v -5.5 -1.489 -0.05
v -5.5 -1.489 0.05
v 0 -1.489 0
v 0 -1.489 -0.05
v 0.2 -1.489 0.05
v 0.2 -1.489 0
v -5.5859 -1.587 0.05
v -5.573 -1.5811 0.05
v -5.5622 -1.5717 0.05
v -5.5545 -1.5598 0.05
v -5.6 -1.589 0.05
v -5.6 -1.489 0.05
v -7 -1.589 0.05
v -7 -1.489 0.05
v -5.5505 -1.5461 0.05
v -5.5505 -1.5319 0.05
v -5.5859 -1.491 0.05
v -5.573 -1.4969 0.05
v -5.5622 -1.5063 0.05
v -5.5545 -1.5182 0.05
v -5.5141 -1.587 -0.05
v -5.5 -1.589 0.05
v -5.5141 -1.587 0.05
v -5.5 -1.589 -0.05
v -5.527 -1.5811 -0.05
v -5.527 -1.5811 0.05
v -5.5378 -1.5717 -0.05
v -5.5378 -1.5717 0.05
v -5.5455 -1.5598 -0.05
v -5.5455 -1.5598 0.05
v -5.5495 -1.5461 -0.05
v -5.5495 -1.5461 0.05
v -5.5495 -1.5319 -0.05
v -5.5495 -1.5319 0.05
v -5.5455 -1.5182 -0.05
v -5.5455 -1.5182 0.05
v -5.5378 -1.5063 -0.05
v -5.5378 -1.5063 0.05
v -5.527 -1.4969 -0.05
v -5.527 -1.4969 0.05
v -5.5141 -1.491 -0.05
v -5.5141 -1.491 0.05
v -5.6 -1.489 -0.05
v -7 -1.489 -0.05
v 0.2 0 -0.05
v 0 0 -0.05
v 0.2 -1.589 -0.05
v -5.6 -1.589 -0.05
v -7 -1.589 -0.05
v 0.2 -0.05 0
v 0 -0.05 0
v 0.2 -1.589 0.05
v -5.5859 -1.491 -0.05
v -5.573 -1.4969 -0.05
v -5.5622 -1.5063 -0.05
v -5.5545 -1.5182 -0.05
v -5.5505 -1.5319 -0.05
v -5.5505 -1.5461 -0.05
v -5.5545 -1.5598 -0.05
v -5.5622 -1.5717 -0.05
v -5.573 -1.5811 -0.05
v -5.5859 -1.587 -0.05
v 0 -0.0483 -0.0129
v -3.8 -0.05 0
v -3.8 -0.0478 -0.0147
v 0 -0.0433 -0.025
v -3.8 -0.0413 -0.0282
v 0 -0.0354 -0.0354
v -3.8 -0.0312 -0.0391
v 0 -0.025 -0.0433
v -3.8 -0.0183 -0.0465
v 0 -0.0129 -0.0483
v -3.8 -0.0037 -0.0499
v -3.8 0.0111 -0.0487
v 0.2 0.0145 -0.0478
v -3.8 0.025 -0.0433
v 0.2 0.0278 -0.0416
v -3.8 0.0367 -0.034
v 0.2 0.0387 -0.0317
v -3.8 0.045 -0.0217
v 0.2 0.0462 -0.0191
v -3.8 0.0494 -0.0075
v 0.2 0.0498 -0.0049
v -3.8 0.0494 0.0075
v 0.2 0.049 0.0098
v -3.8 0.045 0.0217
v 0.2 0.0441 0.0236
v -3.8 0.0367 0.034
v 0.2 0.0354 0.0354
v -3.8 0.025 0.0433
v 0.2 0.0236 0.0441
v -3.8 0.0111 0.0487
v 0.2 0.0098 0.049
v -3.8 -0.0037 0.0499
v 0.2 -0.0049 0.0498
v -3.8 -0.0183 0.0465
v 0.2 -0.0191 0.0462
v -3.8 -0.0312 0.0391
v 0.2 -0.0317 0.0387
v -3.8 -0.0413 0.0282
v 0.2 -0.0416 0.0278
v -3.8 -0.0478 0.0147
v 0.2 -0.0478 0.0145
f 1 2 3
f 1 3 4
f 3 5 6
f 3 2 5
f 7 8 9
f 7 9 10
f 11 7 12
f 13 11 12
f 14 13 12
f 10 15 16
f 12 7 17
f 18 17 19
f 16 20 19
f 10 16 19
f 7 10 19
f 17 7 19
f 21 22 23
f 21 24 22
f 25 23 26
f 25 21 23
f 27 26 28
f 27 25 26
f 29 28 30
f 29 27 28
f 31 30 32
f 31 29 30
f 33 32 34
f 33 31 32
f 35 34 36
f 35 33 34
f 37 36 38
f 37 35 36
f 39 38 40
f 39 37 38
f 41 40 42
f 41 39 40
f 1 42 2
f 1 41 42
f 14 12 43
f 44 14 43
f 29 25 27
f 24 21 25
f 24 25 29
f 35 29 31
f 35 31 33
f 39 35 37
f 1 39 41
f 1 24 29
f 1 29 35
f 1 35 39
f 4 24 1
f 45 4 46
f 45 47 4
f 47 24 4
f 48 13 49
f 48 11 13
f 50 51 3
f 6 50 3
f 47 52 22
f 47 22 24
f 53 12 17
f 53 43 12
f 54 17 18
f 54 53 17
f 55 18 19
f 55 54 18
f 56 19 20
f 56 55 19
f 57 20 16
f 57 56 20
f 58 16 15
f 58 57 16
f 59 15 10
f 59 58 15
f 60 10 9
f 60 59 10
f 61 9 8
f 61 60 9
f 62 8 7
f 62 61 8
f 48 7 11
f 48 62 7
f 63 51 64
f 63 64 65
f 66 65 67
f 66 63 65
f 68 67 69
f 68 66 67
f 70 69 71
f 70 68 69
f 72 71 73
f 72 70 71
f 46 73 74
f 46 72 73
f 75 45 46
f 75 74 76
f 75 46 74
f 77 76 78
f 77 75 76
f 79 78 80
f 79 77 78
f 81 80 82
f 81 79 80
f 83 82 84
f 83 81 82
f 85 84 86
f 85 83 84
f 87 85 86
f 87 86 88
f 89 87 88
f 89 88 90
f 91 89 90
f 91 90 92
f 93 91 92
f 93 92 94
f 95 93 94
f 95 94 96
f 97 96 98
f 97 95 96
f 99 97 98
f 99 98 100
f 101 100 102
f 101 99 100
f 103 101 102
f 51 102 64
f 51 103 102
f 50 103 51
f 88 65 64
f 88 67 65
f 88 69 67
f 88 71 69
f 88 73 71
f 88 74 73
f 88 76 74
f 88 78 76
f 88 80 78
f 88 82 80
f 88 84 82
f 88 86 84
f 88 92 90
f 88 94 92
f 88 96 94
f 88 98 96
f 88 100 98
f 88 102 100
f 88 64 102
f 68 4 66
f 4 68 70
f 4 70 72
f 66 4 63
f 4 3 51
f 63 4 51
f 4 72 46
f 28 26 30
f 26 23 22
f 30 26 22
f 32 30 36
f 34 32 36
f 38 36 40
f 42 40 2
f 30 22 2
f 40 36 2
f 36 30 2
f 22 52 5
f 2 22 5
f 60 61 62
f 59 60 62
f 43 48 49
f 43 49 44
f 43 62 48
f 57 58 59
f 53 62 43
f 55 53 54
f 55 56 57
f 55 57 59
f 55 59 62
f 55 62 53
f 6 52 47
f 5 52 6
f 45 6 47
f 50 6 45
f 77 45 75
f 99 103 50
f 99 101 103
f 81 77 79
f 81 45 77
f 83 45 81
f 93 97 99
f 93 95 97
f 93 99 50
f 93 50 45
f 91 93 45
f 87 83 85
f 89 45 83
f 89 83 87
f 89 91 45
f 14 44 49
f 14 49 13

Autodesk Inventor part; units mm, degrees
ref_plane "YZ Plane" through (0, 0, 0) normal (1, 0, 0) x (0, 1, 0)
ref_plane "XZ Plane" through (0, 0, 0) normal (0, 1, 0) x (-1, 0, 0)
ref_plane "XY Plane" through (0, 0, 0) normal (0, 0, 1) x (1, 0, 0)
sketch "Sketch1" plane through (0, 0, 0) normal (1, 0, 0) x (0, 1, 0)
  circle A0 centre (0, 0) radius 0.05
  line L0 (0, 0) -> (-1.539, 0)
  line L1 (-1.589, 0.05) -> (-1.489, 0.05)
  line L2 (-1.489, 0.05) -> (-1.489, -0.05)
  line L3 (-1.489, -0.05) -> (-1.589, -0.05)
  line L4 (-1.589, -0.05) -> (-1.589, 0.05)
  line L5 (-1.589, 0.05) -> (-1.489, -0.05) construction
  line L6 (-1.489, 0.05) -> (-1.589, -0.05) construction
  line L7 (-1.489, -0.05) -> (0, -0.05)
  point P0 (-0.05, 0)
  point P1 (-1.489, 0)
  dimension "d0" = 0.1
  dimension "d1" = 1.539
  dimension "d2" = 0.1
  dimension "d3" = 0.1
extrude "Extrusion1" add sketch "Sketch1" along normal blind 0.2
sketch "Sketch2" plane through (0, 0, 0) normal (-1, 0, 0) x (0, 0, 1)
  arc A0 (0, -0.05) -> (-0.05, 0) centre (0, 0) ccw projected
  circle A1 centre (0, 0) radius 0.05
  point P0 (-0.05, 0)
  point P1 (0, -0.05)
  dimension "d6" = 0.1
extrude "Extrusion2" add sketch "Sketch2" along normal blind 3.8
sketch "Sketch3" plane through (0, 0, 0) normal (-1, 0, 0) x (0, 0, 1)
  line L0 (-0.05, -1.589) -> (-0.05, 0) projected
  line L1 (0.05, -1.589) -> (-0.05, -1.589) projected
  line L2 (-0.05, -1.589) -> (0.05, -1.589)
  line L3 (0, -1.489) -> (0.05, -1.489) projected
  line L4 (0.05, -1.589) -> (0.05, -1.489)
  line L5 (0.05, -1.489) -> (-0.05, -1.489)
  line L6 (-0.05, -1.489) -> (-0.05, -1.589)
  point P0 (0, 0)
extrude "Extrusion3" add sketch "Sketch3" along normal blind 7
ref_plane "Work Plane1" through (-5.55, 0, 0) normal (1, 0, 0) x (0, 0, -1)
split body "Split1" result two bodies by plane through (-5.55, 0, 0) normal (1, 0, 0) first body at (-1.2667, -0.0285, 0.0093)
sketch "Sketch5" plane through (-7, -1.589, -0.05) normal (0, 0, -1) x (-1, 0, 0)
  line L0 (-1.45, 0.1) -> (-1.45, 0) projected
  line L1 (-1.45, 0.05) -> (-1.4, 0.05)
  circle A0 centre (-1.4, 0.05) radius 0.05
  line L2 (-1.45, 0) -> (-7.2, 0) projected
  line L3 (-1.45, 0) -> (-1.45, 0.1)
  line L4 (-7, 0.1) -> (-1.45, 0.1) projected
  line L5 (-1.45, 0.1) -> (-1.4, 0.1)
  line L6 (-1.45, 0.1) -> (0, 0.1) projected
  line L7 (-1.45, 0) -> (-1.4, 0)
  line L8 (-1.45, 0) -> (0, 0) projected
  point P0 (-7, 1.589)
  dimension "d14" = 0.05
extrude "Extrusion5" cut sketch "Sketch5" against normal blind 10 contours L5 A0 L0 | A0 L7 L0 bodies 3
sketch "Sketch6" plane through (0, -1.489, -0.05) normal (0, 0, -1) x (-1, 0, 0)
  line L0 (5.55, 0) -> (5.55, -0.1) projected
  line L1 (5.55, -0.05) -> (5.5, -0.05)
  circle A0 centre (5.5, -0.05) radius 0.05
  line L2 (0, 0) -> (5.55, 0) projected
  line L3 (5.5, 0) -> (5.55, 0)
  line L4 (5.55, -0.1) -> (-0.2, -0.1) projected
  line L5 (5.55, 0) -> (5.55, -0.1)
  line L6 (5.55, -0.1) -> (5.5, -0.1)
  point P0 (0, 1.489)
  dimension "d17" = 0.05
extrude "Extrusion6" cut sketch "Sketch6" against normal blind 10 contours L0 A0 L2 | L0 L4 A0 bodies 2
properties part number "Bone_16_10_Fix"
